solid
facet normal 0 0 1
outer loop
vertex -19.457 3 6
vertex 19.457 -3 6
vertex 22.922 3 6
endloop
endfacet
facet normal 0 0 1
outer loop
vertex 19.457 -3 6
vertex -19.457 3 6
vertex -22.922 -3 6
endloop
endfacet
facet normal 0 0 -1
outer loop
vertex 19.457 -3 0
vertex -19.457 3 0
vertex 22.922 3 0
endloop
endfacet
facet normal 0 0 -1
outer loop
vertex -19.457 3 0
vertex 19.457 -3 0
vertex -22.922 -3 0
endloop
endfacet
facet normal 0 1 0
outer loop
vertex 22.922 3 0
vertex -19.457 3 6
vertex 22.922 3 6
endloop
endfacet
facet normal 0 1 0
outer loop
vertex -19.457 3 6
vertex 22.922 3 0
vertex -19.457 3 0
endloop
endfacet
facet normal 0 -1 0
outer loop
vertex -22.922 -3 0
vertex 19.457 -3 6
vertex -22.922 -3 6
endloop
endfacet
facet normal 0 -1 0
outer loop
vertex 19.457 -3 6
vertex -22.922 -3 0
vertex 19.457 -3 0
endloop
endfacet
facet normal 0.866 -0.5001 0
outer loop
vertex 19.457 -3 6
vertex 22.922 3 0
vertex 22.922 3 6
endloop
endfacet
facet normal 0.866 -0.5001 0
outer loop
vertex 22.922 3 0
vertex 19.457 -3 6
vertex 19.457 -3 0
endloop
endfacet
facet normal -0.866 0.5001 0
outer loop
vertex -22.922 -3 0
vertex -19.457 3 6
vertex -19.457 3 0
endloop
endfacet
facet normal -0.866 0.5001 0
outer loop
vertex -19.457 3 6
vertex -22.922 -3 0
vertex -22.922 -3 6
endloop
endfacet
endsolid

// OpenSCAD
shaft_insert_height = 4;
shaft_diameter = 12;

cruz_base_diameter = 15;
cruz_base_height = 10;

arm_length= 50;
arm_height = cruz_base_height - shaft_insert_height;
 
 module arm_base(){
     cube([arm_length, arm_height, arm_height], center=true);
     }
 
 module arm(){
     difference(){
         {arm_base();}
         translate([arm_length/2, 0, 0]) rotate([0, 0, 60]) scale(1.1) {arm_base();}
         translate([-arm_length/2, 0, 0]) rotate([0, 0, 60]) scale(1.1) {arm_base();}
         }
     }
     
translate([0, 0, arm_height/2]) arm();
